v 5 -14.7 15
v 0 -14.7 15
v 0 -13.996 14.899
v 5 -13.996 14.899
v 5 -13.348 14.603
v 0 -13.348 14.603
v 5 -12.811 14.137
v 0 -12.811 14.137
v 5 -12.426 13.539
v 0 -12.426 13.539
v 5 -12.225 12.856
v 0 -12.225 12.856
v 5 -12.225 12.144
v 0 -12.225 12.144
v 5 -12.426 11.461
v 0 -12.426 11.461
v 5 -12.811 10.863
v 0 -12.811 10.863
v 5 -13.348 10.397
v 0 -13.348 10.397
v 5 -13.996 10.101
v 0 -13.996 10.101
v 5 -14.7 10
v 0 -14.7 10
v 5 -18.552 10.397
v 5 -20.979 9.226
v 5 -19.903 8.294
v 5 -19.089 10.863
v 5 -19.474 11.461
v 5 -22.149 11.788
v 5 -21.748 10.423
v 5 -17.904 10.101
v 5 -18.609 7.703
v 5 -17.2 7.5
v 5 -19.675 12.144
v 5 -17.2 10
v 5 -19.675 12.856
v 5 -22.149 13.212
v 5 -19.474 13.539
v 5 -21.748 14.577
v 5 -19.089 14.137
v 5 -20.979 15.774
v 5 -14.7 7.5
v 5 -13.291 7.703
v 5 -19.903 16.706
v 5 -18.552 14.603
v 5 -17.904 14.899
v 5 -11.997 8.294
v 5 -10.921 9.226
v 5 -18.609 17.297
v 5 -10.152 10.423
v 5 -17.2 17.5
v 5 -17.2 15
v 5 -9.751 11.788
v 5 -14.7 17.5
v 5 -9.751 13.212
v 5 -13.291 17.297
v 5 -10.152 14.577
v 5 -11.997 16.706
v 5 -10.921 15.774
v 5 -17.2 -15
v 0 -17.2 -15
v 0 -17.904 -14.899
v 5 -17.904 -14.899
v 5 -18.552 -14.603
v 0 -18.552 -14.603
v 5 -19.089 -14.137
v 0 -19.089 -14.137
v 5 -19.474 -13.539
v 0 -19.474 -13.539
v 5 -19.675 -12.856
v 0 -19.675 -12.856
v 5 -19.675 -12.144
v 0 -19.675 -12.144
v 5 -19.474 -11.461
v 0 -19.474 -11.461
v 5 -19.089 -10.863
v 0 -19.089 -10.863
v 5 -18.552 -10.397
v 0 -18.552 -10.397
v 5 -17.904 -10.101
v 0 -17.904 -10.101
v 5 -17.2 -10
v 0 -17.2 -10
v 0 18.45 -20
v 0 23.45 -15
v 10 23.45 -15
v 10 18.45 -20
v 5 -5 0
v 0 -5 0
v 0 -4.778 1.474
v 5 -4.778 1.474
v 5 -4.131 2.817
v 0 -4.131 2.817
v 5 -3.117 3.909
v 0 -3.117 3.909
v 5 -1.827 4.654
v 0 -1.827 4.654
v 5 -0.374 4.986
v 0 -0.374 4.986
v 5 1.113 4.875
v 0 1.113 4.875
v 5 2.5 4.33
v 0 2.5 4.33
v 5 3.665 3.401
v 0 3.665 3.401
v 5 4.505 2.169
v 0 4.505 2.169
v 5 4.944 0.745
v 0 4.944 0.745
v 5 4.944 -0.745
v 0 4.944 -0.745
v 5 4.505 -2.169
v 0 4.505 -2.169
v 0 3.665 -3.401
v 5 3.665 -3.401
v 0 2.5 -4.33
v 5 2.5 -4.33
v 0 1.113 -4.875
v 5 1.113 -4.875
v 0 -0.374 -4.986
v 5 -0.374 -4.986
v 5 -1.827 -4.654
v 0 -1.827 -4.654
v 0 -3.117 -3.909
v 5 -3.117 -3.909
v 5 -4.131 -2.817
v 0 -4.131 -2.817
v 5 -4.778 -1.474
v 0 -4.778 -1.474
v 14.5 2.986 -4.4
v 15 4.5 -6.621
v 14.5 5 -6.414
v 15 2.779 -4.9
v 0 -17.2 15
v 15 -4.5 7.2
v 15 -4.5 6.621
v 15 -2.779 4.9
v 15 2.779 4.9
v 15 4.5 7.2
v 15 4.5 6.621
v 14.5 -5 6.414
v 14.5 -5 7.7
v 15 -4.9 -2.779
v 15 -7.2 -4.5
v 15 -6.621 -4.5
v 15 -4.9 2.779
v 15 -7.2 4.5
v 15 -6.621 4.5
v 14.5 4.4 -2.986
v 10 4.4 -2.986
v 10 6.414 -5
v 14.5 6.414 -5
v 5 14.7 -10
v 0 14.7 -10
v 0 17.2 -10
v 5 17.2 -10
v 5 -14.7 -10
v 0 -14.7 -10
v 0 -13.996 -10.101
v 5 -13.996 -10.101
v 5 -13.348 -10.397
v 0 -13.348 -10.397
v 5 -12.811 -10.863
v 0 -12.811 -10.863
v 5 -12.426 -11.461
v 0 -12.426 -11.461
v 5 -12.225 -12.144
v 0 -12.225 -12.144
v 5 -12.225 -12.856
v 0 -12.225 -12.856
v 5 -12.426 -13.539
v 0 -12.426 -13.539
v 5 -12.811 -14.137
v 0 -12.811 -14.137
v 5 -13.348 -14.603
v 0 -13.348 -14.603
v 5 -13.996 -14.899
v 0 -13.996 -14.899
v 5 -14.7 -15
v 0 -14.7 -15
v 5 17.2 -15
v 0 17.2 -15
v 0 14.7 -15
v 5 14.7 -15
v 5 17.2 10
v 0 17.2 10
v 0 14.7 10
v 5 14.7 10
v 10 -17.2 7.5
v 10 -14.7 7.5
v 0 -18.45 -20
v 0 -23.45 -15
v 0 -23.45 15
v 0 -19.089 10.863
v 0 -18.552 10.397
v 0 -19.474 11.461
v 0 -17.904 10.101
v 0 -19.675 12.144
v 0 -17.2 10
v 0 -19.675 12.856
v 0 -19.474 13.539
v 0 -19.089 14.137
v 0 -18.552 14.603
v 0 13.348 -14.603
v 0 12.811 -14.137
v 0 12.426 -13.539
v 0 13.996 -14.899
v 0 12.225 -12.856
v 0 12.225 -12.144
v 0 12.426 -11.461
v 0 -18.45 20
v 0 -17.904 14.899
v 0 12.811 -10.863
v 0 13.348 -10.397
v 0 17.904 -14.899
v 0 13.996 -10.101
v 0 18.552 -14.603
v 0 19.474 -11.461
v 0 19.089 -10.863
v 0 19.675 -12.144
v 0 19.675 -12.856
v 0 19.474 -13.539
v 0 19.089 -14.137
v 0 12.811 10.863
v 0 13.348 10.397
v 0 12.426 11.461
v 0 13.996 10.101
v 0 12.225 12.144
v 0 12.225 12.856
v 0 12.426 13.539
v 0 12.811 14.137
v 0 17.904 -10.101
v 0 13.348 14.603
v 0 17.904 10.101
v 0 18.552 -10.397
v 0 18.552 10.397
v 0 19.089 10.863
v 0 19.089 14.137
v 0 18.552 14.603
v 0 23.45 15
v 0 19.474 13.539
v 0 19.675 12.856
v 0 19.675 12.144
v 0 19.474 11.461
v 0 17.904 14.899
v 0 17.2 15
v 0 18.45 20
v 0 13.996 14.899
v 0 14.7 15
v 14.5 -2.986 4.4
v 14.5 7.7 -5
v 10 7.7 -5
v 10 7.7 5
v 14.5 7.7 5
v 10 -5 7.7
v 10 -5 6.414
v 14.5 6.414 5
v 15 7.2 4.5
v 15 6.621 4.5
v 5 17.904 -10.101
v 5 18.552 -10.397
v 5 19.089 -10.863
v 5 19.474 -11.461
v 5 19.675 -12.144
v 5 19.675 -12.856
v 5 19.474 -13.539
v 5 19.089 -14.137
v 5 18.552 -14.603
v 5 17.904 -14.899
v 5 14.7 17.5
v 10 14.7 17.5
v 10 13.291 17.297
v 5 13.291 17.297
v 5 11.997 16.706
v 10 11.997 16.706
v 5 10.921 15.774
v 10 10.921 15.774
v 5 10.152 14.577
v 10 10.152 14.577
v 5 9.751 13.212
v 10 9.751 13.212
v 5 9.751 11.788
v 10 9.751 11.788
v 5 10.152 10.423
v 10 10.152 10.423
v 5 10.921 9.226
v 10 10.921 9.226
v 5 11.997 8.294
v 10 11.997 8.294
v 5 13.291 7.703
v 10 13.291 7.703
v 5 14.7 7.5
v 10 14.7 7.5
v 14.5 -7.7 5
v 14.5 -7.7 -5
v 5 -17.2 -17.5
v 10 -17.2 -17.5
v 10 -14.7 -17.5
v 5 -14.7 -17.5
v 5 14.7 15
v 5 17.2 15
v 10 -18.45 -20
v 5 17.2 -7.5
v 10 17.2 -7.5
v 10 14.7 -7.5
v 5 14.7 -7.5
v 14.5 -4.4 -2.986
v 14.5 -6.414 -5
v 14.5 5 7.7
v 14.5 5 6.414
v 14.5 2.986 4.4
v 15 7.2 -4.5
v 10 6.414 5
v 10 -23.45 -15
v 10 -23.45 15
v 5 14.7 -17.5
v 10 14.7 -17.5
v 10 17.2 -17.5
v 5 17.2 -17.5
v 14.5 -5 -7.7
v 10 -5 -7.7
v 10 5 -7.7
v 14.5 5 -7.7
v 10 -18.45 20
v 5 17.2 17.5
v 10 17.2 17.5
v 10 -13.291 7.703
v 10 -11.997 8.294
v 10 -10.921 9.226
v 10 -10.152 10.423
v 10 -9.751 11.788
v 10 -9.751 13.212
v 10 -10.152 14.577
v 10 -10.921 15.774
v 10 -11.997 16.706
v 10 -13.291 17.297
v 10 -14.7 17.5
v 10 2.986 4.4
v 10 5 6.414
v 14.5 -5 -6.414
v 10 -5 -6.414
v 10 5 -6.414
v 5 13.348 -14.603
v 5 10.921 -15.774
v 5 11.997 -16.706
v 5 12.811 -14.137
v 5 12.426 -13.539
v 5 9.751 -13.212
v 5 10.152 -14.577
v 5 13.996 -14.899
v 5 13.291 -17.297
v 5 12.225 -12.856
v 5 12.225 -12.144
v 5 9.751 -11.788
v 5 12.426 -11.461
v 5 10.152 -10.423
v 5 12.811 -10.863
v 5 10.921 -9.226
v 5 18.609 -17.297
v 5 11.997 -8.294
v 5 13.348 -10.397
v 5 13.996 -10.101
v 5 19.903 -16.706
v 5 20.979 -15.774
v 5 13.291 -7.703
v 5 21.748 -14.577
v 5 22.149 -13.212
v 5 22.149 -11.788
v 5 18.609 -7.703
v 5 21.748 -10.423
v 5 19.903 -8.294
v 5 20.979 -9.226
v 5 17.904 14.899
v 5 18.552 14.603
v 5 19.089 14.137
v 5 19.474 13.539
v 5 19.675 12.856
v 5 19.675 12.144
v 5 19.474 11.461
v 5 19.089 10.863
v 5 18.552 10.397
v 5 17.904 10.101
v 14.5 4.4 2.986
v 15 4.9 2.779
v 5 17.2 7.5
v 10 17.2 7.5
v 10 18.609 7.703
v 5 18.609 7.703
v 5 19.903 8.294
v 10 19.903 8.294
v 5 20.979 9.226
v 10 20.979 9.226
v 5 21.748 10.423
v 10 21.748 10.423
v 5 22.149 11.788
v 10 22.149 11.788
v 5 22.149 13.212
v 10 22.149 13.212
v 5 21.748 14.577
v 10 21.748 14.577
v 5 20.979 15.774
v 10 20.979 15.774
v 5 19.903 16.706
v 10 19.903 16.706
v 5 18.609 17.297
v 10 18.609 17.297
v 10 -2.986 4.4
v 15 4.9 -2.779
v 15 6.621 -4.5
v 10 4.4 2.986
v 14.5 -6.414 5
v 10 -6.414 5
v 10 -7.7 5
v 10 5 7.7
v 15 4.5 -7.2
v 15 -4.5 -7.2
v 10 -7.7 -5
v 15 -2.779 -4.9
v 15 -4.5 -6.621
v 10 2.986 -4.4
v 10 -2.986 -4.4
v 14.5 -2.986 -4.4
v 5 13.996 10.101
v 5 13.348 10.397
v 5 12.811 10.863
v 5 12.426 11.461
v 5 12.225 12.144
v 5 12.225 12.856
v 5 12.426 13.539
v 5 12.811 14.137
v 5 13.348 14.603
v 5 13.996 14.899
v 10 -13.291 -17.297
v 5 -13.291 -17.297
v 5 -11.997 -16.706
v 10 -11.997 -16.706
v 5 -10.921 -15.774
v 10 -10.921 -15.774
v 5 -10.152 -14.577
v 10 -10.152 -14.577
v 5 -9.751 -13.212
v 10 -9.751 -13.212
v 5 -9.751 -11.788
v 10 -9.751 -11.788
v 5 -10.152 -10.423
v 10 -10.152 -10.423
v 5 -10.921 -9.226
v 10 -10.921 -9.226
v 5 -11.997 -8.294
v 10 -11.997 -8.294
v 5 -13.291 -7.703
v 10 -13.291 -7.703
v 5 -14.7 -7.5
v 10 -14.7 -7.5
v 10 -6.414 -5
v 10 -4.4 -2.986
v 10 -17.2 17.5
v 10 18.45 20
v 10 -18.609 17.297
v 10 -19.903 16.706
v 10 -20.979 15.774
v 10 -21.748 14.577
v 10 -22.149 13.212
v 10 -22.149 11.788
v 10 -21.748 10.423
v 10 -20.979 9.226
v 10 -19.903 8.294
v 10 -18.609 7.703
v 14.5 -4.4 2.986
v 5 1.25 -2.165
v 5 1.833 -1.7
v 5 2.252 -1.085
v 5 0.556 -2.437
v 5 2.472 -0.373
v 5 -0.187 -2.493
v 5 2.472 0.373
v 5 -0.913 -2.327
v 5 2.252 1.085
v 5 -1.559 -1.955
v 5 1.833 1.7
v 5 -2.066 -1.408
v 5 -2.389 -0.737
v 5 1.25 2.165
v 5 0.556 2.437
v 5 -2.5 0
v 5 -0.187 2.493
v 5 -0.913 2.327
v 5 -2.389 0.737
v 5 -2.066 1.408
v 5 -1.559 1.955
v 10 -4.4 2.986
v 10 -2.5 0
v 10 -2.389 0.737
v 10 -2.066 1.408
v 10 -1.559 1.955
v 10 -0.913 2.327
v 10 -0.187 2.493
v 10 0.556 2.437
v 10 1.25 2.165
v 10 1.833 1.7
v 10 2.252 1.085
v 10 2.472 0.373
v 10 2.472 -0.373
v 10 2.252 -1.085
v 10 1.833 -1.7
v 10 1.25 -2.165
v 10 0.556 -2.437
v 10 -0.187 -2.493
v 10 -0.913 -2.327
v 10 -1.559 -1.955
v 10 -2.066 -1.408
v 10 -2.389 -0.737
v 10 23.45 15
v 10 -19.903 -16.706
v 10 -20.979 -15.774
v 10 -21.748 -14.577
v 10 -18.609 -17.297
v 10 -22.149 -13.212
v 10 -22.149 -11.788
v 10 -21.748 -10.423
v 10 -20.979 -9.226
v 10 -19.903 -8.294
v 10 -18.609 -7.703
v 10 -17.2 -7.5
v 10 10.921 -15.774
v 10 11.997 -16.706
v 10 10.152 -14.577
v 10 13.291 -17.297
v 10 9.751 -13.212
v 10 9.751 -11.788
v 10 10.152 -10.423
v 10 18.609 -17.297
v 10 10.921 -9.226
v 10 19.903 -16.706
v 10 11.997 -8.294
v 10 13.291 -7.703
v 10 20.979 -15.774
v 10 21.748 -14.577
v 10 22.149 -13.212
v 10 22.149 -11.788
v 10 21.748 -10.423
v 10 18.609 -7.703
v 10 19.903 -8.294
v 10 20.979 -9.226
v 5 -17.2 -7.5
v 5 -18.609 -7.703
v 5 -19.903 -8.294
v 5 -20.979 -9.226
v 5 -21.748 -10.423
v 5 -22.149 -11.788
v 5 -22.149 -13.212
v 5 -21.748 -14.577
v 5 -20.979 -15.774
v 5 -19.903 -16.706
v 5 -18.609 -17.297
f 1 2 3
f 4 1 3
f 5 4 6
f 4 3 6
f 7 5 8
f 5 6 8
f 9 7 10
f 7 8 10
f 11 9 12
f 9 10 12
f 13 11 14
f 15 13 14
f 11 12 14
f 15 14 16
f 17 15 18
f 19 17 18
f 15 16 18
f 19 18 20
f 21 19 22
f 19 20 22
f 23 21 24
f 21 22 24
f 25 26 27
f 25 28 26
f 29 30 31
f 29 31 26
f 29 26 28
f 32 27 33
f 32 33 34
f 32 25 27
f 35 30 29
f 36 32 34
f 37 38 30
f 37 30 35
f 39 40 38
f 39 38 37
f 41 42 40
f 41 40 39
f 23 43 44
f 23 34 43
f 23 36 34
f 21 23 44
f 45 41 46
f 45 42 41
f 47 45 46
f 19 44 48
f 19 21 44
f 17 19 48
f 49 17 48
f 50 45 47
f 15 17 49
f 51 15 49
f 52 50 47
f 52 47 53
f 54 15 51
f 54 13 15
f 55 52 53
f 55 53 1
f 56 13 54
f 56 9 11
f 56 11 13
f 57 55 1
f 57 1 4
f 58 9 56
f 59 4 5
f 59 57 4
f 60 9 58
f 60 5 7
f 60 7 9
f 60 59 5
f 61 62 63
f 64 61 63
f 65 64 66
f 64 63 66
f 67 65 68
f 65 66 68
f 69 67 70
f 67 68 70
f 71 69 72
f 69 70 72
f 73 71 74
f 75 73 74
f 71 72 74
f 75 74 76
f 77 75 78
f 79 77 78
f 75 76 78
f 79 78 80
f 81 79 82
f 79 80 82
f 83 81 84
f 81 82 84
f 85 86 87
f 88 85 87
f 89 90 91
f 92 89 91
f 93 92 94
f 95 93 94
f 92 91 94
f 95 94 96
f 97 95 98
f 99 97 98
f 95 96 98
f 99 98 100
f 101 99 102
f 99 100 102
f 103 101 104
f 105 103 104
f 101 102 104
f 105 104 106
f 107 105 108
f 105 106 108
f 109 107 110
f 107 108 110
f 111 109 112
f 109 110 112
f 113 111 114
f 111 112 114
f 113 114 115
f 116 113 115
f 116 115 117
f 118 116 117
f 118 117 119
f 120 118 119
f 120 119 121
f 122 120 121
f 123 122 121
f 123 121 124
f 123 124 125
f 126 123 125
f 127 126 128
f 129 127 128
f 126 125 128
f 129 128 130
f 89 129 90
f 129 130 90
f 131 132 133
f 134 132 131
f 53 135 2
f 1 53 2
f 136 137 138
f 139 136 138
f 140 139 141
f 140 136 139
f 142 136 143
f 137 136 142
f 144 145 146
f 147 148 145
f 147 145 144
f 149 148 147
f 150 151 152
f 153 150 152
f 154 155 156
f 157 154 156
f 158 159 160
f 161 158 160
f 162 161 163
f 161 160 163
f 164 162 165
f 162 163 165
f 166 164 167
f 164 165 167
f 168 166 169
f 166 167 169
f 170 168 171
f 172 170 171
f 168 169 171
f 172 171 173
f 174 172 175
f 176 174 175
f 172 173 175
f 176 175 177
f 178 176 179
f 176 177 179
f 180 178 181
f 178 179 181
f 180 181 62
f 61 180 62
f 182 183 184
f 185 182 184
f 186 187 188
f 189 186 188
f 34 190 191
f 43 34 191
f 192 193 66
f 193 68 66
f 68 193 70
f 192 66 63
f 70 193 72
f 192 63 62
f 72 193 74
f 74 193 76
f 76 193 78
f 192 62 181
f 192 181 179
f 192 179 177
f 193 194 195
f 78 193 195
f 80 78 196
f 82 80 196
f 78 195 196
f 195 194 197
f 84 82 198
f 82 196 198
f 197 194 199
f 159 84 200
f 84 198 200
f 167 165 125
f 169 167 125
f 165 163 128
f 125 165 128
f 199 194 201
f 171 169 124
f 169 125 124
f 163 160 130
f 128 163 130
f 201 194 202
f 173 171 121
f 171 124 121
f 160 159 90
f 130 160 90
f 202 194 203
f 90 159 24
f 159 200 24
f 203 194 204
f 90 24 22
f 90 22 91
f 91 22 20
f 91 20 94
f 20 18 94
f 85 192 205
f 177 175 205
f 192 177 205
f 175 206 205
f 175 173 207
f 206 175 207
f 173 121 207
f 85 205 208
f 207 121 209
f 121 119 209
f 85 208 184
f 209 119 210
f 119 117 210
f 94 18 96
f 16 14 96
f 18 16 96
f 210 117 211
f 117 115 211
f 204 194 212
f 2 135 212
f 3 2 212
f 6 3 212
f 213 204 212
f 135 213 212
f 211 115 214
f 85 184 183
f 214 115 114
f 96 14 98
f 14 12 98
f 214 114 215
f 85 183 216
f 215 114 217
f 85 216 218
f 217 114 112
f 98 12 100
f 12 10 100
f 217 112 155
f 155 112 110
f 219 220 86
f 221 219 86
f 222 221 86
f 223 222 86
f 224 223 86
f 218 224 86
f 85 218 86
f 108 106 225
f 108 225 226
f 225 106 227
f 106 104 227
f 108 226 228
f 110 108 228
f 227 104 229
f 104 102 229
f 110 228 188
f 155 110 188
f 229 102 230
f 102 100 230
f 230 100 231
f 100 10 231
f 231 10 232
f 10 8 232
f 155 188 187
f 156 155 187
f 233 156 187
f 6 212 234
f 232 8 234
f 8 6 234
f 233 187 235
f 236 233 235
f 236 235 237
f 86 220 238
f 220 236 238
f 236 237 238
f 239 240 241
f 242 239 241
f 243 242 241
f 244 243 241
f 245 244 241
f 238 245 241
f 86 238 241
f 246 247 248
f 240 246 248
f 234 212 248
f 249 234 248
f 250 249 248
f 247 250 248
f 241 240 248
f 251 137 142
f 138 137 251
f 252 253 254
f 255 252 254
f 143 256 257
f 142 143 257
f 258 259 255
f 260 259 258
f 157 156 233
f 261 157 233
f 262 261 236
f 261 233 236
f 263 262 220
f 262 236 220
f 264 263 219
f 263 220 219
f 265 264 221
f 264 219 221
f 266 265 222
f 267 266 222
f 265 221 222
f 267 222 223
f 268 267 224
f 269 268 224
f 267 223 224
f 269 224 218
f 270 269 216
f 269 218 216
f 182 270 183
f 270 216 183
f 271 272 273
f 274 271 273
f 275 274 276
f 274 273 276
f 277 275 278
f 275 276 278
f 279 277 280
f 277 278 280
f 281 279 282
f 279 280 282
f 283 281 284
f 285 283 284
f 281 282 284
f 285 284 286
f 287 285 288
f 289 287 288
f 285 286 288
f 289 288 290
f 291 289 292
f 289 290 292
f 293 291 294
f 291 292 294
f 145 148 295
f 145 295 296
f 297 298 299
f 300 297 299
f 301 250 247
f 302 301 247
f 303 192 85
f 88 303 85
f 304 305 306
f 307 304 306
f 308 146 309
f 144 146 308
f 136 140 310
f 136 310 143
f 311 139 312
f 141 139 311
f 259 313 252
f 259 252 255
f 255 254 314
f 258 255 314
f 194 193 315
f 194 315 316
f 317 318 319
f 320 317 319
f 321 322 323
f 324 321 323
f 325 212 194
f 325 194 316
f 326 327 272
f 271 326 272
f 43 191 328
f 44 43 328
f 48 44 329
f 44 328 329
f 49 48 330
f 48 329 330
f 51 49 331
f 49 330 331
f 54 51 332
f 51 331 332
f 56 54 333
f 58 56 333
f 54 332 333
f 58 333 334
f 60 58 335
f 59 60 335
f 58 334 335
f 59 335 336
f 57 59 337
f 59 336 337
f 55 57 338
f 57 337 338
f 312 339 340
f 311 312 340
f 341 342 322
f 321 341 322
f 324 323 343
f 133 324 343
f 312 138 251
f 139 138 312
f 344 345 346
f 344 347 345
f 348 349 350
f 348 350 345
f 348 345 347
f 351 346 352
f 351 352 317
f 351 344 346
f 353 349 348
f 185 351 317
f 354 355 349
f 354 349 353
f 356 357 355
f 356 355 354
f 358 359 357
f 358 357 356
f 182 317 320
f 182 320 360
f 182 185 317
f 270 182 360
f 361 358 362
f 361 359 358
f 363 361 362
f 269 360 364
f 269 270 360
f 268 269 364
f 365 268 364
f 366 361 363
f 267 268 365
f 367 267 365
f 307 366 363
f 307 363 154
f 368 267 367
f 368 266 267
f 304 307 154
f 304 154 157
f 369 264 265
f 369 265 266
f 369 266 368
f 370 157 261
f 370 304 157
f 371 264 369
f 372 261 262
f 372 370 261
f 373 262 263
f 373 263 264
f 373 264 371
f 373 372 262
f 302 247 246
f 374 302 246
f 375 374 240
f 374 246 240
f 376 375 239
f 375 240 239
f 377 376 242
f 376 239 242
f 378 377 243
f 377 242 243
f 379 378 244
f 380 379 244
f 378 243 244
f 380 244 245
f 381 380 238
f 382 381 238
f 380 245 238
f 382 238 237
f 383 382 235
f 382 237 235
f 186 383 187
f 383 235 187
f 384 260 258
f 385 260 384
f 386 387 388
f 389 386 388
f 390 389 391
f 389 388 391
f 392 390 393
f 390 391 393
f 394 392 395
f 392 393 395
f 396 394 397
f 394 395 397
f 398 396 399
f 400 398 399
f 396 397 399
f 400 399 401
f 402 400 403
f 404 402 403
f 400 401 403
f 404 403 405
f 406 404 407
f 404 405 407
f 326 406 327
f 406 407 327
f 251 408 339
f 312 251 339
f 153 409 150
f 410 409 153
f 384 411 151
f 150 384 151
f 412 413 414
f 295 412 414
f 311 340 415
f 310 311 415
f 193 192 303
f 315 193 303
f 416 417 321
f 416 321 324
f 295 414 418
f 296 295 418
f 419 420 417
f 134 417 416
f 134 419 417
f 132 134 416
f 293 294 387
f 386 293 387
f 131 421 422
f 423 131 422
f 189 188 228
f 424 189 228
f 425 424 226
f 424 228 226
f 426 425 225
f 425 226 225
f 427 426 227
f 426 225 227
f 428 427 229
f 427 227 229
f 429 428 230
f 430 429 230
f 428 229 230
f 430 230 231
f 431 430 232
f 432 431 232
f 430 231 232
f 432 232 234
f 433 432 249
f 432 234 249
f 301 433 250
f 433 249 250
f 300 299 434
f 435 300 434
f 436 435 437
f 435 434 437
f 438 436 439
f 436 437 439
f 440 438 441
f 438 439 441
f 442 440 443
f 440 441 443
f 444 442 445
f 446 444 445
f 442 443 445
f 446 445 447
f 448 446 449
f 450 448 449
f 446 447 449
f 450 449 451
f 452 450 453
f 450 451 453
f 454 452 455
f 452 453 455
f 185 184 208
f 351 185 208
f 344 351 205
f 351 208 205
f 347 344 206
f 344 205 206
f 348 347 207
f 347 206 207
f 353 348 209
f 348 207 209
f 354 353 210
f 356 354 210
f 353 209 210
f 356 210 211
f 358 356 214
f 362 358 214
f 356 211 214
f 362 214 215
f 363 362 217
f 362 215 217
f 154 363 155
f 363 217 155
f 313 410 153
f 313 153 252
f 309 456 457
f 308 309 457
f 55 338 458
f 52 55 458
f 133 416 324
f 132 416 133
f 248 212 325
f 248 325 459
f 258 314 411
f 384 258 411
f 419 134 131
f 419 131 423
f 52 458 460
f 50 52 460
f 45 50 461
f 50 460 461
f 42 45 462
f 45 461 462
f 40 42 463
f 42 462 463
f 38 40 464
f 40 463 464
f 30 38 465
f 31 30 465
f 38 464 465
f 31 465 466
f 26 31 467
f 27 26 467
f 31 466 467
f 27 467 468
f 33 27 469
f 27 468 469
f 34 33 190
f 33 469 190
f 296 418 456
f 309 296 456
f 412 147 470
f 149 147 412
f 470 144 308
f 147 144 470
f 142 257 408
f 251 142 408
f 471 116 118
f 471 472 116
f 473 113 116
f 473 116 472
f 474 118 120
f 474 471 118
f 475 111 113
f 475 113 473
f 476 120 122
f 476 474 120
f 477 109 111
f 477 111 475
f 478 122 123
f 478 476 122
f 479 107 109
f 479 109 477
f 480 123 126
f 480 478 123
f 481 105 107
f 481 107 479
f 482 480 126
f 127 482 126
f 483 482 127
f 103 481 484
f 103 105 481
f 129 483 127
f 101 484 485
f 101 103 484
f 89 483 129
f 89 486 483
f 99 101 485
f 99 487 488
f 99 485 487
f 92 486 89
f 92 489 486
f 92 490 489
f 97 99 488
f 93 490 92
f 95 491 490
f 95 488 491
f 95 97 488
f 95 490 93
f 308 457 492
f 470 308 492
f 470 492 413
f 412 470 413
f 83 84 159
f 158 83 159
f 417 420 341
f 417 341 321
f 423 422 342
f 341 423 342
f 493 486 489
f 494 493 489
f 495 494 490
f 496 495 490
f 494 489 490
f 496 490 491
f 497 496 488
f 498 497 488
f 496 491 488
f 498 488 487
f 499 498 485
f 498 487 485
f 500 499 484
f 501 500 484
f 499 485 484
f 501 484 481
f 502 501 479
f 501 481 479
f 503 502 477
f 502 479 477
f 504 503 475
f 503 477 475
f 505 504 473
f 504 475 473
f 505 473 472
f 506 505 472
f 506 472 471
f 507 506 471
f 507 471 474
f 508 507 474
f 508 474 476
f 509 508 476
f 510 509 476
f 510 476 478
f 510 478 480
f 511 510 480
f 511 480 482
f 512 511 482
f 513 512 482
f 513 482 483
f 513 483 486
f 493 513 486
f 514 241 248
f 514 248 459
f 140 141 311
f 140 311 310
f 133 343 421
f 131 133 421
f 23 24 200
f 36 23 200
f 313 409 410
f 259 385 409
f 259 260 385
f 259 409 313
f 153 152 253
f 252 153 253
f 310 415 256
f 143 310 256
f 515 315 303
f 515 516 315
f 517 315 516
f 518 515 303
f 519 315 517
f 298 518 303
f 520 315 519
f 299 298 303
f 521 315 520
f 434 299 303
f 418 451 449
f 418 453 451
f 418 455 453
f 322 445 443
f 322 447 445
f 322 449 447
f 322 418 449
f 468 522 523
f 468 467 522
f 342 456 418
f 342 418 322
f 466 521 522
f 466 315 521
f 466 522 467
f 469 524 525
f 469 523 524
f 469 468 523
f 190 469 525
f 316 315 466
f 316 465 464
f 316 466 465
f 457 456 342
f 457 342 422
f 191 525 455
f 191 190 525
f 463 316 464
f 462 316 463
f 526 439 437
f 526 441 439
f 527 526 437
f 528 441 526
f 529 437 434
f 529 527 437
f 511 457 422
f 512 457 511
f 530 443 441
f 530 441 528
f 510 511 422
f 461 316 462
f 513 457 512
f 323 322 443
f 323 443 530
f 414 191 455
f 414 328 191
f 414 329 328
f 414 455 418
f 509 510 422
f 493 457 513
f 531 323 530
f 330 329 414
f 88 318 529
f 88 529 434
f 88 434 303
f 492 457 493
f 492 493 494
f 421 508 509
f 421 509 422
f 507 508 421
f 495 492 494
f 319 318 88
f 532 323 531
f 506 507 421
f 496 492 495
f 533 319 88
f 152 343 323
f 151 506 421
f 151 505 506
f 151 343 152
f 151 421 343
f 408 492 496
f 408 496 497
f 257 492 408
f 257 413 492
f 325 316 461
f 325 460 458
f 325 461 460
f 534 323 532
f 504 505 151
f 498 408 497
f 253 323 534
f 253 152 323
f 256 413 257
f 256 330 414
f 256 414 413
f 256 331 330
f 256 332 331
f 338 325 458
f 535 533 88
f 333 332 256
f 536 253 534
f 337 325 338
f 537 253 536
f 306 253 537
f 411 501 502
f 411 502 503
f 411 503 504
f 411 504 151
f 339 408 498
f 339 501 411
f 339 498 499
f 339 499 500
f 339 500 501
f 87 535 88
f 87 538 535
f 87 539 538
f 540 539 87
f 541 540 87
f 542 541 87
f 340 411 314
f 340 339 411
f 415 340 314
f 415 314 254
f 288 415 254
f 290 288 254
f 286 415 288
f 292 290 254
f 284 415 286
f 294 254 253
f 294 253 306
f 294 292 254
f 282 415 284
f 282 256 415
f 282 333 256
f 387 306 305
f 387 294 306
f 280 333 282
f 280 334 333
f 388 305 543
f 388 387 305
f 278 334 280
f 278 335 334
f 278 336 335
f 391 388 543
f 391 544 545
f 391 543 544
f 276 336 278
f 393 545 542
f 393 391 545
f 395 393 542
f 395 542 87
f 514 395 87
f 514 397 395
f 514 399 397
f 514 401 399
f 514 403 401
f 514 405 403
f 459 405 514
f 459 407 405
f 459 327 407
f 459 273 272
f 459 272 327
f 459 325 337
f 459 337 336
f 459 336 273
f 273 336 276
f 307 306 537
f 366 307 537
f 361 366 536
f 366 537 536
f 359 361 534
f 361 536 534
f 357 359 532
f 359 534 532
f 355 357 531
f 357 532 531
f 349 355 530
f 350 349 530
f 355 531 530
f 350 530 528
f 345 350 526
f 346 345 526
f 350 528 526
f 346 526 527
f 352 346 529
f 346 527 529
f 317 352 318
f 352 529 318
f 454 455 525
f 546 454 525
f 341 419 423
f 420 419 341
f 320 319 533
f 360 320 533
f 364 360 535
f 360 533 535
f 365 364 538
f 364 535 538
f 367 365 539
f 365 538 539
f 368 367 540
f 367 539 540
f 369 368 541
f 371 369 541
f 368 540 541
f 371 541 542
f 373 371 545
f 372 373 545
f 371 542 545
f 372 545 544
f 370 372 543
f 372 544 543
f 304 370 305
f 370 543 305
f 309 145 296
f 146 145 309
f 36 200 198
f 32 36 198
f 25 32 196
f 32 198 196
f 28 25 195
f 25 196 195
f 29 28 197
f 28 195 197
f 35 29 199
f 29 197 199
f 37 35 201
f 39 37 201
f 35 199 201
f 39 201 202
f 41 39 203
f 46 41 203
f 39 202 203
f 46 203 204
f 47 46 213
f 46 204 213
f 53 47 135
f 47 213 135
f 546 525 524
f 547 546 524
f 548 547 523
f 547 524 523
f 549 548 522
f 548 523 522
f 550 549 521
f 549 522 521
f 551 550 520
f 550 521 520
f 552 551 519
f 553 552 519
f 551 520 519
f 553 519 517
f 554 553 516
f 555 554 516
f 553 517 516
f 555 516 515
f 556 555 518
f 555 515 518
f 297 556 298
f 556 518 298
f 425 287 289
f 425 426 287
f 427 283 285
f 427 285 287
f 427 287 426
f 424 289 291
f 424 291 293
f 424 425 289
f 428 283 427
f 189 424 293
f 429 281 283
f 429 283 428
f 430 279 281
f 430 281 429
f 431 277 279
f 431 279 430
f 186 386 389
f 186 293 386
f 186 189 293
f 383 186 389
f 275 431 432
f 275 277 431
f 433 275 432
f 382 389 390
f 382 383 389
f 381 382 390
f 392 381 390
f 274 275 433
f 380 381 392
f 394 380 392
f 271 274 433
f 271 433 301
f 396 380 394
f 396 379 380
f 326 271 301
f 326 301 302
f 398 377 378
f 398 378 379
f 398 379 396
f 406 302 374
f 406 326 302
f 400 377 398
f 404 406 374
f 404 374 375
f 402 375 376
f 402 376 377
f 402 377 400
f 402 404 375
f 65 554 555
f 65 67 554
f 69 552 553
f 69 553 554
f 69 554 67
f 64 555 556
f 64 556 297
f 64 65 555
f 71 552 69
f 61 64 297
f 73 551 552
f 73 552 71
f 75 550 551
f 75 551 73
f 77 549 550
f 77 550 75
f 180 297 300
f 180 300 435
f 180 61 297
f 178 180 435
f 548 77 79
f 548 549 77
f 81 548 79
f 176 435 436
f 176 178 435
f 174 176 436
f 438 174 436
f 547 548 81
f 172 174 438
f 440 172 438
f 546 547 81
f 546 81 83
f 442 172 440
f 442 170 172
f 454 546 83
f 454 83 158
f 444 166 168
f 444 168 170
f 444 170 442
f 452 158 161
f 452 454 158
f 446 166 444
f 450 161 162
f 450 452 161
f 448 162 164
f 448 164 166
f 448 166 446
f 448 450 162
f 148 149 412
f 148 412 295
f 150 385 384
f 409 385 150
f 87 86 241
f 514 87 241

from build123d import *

# Parameters (mm, degrees)
F0_W      = 46.9
F0_H      = 40
F1_DEPTH  = 10
F2_SIZE   = 5
F4_DEPTH  = 5
F5_SIZE   = 0.5
F6_R      = 5
F6_R_2    = 2.5
F7_DEPTH  = 5
F8_DEPTH  = 15.001
F10_DEPTH = 5


with BuildPart() as f1:
    # F0 (on Right) → F1 (new body)
    with BuildSketch(Plane.YZ):
        Rectangle(F0_W, F0_H)
        with BuildLine():
            Line((-14.7, -15), (-17.2, -15))
            ThreePointArc((-17.2, -15), (-19.7, -12.5), (-17.2, -10))
            Line((-17.2, -10), (-14.7, -10))
            ThreePointArc((-14.7, -10), (-12.2, -12.5), (-14.7, -15))
        make_face(mode=Mode.SUBTRACT)
        with BuildLine():
            ThreePointArc((14.7, -15), (12.2, -12.5), (14.7, -10))
            Line((14.7, -10), (17.2, -10))
            ThreePointArc((17.2, -10), (19.7, -12.5), (17.2, -15))
            Line((17.2, -15), (14.7, -15))
        make_face(mode=Mode.SUBTRACT)
        with BuildLine():
            ThreePointArc((-14.7, 15), (-12.2, 12.5), (-14.7, 10))
            Line((-14.7, 10), (-17.2, 10))
            ThreePointArc((-17.2, 10), (-19.7, 12.5), (-17.2, 15))
            Line((-17.2, 15), (-14.7, 15))
        make_face(mode=Mode.SUBTRACT)
        with BuildLine():
            Line((17.2, 10), (14.7, 10))
            ThreePointArc((14.7, 10), (12.2, 12.5), (14.7, 15))
            Line((14.7, 15), (17.2, 15))
            ThreePointArc((17.2, 15), (19.7, 12.5), (17.2, 10))
        make_face(mode=Mode.SUBTRACT)
    extrude(amount=F1_DEPTH)

    # F2
    f2_edges = [f1.edges().sort_by_distance(p)[0] for p in [
        (5, -23.45, -20),
        (5, -23.45, 20),
        (5, 23.45, -20),
        (5, 23.45, 20),
    ]]
    chamfer(f2_edges, length=F2_SIZE)

    # F3 (on face) → F4 (join)
    with BuildSketch(Plane.YZ.offset(10)):
        Polygon((0, 4.4), (2.9857864376, 4.4), (5, 6.4142135624), (5, 7.7), (-5, 7.7), (-5, 6.4142135624), (-2.9857864376, 4.4), align=None)
        Polygon((-7.7, 5), (-7.7, -5), (-6.4142135624, -5), (-4.4, -2.9857864376), (-4.4, 0), (-4.4, 2.9857864376), (-6.4142135624, 5), align=None)
        Polygon((-5, -7.7), (5, -7.7), (5, -6.4142135624), (2.9857864376, -4.4), (0, -4.4), (-2.9857864376, -4.4), (-5, -6.4142135624), align=None)
        Polygon((7.7, -5), (7.7, 5), (6.4142135624, 5), (4.4, 2.9857864376), (4.4, 0), (4.4, -2.9857864376), (6.4142135624, -5), align=None)
    extrude(amount=F4_DEPTH)

    # F5
    f5_edges = [f1.edges().sort_by_distance(p)[0] for p in [
        (15, -5, -7.057107),
        (15, 0, -7.7),
        (15, 5, -7.057107),
        (15, 3.992893, -5.407107),
        (15, 0, -4.4),
        (15, -3.992893, -5.407107),
        (15, -7.057107, 5),
        (15, -7.7, 0),
        (15, -7.057107, -5),
        (15, -5.407107, -3.992893),
        (15, -4.4, 0),
        (15, -5.407107, 3.992893),
        (15, 0, 4.4),
        (15, 3.992893, 5.407107),
        (15, 5, 7.057107),
        (15, 0, 7.7),
        (15, -5, 7.057107),
        (15, -3.992893, 5.407107),
        (15, 4.4, 0),
        (15, 5.407107, -3.992893),
        (15, 7.057107, -5),
        (15, 7.7, 0),
        (15, 7.057107, 5),
        (15, 5.407107, 3.992893),
    ]]
    chamfer(f5_edges, length=F5_SIZE)

    # F6 (on face) → F7 (cut)
    with BuildSketch(Plane(origin=(0, 0, 0), x_dir=(0, -1, 0), z_dir=(-1, 0, 0))):
        Circle(F6_R)
        Circle(F6_R_2, mode=Mode.SUBTRACT)
    extrude(amount=-F7_DEPTH, mode=Mode.SUBTRACT)

    # F8 (cut, through all): a face of the model
    f8_faces = [f1.faces().sort_by_distance(p)[0] for p in [
        (0, 0, 0),
    ]]
    extrude(f8_faces, amount=-F8_DEPTH, mode=Mode.SUBTRACT)

    # F9 (on face) → F10 (cut)
    with BuildSketch(Plane.YZ.offset(10)):
        with BuildLine():
            ThreePointArc((17.2, 7.5), (22.2, 12.5), (17.2, 17.5))
            Line((17.2, 17.5), (14.7, 17.5))
            ThreePointArc((14.7, 17.5), (9.7, 12.5), (14.7, 7.5))
            Line((14.7, 7.5), (17.2, 7.5))
        make_face()
        with BuildLine():
            ThreePointArc((-14.7, 7.5), (-9.7, 12.5), (-14.7, 17.5))
            Line((-14.7, 17.5), (-17.2, 17.5))
            ThreePointArc((-17.2, 17.5), (-22.2, 12.5), (-17.2, 7.5))
            Line((-17.2, 7.5), (-14.7, 7.5))
        make_face()
        with BuildLine():
            ThreePointArc((-17.2, -7.5), (-22.2, -12.5), (-17.2, -17.5))
            Line((-17.2, -17.5), (-14.7, -17.5))
            ThreePointArc((-14.7, -17.5), (-9.7, -12.5), (-14.7, -7.5))
            Line((-14.7, -7.5), (-17.2, -7.5))
        make_face()
        with BuildLine():
            ThreePointArc((14.7, -7.5), (9.7, -12.5), (14.7, -17.5))
            Line((14.7, -17.5), (17.2, -17.5))
            ThreePointArc((17.2, -17.5), (22.2, -12.5), (17.2, -7.5))
            Line((17.2, -7.5), (14.7, -7.5))
        make_face()
    extrude(amount=-F10_DEPTH, mode=Mode.SUBTRACT)


solid = f1.part
